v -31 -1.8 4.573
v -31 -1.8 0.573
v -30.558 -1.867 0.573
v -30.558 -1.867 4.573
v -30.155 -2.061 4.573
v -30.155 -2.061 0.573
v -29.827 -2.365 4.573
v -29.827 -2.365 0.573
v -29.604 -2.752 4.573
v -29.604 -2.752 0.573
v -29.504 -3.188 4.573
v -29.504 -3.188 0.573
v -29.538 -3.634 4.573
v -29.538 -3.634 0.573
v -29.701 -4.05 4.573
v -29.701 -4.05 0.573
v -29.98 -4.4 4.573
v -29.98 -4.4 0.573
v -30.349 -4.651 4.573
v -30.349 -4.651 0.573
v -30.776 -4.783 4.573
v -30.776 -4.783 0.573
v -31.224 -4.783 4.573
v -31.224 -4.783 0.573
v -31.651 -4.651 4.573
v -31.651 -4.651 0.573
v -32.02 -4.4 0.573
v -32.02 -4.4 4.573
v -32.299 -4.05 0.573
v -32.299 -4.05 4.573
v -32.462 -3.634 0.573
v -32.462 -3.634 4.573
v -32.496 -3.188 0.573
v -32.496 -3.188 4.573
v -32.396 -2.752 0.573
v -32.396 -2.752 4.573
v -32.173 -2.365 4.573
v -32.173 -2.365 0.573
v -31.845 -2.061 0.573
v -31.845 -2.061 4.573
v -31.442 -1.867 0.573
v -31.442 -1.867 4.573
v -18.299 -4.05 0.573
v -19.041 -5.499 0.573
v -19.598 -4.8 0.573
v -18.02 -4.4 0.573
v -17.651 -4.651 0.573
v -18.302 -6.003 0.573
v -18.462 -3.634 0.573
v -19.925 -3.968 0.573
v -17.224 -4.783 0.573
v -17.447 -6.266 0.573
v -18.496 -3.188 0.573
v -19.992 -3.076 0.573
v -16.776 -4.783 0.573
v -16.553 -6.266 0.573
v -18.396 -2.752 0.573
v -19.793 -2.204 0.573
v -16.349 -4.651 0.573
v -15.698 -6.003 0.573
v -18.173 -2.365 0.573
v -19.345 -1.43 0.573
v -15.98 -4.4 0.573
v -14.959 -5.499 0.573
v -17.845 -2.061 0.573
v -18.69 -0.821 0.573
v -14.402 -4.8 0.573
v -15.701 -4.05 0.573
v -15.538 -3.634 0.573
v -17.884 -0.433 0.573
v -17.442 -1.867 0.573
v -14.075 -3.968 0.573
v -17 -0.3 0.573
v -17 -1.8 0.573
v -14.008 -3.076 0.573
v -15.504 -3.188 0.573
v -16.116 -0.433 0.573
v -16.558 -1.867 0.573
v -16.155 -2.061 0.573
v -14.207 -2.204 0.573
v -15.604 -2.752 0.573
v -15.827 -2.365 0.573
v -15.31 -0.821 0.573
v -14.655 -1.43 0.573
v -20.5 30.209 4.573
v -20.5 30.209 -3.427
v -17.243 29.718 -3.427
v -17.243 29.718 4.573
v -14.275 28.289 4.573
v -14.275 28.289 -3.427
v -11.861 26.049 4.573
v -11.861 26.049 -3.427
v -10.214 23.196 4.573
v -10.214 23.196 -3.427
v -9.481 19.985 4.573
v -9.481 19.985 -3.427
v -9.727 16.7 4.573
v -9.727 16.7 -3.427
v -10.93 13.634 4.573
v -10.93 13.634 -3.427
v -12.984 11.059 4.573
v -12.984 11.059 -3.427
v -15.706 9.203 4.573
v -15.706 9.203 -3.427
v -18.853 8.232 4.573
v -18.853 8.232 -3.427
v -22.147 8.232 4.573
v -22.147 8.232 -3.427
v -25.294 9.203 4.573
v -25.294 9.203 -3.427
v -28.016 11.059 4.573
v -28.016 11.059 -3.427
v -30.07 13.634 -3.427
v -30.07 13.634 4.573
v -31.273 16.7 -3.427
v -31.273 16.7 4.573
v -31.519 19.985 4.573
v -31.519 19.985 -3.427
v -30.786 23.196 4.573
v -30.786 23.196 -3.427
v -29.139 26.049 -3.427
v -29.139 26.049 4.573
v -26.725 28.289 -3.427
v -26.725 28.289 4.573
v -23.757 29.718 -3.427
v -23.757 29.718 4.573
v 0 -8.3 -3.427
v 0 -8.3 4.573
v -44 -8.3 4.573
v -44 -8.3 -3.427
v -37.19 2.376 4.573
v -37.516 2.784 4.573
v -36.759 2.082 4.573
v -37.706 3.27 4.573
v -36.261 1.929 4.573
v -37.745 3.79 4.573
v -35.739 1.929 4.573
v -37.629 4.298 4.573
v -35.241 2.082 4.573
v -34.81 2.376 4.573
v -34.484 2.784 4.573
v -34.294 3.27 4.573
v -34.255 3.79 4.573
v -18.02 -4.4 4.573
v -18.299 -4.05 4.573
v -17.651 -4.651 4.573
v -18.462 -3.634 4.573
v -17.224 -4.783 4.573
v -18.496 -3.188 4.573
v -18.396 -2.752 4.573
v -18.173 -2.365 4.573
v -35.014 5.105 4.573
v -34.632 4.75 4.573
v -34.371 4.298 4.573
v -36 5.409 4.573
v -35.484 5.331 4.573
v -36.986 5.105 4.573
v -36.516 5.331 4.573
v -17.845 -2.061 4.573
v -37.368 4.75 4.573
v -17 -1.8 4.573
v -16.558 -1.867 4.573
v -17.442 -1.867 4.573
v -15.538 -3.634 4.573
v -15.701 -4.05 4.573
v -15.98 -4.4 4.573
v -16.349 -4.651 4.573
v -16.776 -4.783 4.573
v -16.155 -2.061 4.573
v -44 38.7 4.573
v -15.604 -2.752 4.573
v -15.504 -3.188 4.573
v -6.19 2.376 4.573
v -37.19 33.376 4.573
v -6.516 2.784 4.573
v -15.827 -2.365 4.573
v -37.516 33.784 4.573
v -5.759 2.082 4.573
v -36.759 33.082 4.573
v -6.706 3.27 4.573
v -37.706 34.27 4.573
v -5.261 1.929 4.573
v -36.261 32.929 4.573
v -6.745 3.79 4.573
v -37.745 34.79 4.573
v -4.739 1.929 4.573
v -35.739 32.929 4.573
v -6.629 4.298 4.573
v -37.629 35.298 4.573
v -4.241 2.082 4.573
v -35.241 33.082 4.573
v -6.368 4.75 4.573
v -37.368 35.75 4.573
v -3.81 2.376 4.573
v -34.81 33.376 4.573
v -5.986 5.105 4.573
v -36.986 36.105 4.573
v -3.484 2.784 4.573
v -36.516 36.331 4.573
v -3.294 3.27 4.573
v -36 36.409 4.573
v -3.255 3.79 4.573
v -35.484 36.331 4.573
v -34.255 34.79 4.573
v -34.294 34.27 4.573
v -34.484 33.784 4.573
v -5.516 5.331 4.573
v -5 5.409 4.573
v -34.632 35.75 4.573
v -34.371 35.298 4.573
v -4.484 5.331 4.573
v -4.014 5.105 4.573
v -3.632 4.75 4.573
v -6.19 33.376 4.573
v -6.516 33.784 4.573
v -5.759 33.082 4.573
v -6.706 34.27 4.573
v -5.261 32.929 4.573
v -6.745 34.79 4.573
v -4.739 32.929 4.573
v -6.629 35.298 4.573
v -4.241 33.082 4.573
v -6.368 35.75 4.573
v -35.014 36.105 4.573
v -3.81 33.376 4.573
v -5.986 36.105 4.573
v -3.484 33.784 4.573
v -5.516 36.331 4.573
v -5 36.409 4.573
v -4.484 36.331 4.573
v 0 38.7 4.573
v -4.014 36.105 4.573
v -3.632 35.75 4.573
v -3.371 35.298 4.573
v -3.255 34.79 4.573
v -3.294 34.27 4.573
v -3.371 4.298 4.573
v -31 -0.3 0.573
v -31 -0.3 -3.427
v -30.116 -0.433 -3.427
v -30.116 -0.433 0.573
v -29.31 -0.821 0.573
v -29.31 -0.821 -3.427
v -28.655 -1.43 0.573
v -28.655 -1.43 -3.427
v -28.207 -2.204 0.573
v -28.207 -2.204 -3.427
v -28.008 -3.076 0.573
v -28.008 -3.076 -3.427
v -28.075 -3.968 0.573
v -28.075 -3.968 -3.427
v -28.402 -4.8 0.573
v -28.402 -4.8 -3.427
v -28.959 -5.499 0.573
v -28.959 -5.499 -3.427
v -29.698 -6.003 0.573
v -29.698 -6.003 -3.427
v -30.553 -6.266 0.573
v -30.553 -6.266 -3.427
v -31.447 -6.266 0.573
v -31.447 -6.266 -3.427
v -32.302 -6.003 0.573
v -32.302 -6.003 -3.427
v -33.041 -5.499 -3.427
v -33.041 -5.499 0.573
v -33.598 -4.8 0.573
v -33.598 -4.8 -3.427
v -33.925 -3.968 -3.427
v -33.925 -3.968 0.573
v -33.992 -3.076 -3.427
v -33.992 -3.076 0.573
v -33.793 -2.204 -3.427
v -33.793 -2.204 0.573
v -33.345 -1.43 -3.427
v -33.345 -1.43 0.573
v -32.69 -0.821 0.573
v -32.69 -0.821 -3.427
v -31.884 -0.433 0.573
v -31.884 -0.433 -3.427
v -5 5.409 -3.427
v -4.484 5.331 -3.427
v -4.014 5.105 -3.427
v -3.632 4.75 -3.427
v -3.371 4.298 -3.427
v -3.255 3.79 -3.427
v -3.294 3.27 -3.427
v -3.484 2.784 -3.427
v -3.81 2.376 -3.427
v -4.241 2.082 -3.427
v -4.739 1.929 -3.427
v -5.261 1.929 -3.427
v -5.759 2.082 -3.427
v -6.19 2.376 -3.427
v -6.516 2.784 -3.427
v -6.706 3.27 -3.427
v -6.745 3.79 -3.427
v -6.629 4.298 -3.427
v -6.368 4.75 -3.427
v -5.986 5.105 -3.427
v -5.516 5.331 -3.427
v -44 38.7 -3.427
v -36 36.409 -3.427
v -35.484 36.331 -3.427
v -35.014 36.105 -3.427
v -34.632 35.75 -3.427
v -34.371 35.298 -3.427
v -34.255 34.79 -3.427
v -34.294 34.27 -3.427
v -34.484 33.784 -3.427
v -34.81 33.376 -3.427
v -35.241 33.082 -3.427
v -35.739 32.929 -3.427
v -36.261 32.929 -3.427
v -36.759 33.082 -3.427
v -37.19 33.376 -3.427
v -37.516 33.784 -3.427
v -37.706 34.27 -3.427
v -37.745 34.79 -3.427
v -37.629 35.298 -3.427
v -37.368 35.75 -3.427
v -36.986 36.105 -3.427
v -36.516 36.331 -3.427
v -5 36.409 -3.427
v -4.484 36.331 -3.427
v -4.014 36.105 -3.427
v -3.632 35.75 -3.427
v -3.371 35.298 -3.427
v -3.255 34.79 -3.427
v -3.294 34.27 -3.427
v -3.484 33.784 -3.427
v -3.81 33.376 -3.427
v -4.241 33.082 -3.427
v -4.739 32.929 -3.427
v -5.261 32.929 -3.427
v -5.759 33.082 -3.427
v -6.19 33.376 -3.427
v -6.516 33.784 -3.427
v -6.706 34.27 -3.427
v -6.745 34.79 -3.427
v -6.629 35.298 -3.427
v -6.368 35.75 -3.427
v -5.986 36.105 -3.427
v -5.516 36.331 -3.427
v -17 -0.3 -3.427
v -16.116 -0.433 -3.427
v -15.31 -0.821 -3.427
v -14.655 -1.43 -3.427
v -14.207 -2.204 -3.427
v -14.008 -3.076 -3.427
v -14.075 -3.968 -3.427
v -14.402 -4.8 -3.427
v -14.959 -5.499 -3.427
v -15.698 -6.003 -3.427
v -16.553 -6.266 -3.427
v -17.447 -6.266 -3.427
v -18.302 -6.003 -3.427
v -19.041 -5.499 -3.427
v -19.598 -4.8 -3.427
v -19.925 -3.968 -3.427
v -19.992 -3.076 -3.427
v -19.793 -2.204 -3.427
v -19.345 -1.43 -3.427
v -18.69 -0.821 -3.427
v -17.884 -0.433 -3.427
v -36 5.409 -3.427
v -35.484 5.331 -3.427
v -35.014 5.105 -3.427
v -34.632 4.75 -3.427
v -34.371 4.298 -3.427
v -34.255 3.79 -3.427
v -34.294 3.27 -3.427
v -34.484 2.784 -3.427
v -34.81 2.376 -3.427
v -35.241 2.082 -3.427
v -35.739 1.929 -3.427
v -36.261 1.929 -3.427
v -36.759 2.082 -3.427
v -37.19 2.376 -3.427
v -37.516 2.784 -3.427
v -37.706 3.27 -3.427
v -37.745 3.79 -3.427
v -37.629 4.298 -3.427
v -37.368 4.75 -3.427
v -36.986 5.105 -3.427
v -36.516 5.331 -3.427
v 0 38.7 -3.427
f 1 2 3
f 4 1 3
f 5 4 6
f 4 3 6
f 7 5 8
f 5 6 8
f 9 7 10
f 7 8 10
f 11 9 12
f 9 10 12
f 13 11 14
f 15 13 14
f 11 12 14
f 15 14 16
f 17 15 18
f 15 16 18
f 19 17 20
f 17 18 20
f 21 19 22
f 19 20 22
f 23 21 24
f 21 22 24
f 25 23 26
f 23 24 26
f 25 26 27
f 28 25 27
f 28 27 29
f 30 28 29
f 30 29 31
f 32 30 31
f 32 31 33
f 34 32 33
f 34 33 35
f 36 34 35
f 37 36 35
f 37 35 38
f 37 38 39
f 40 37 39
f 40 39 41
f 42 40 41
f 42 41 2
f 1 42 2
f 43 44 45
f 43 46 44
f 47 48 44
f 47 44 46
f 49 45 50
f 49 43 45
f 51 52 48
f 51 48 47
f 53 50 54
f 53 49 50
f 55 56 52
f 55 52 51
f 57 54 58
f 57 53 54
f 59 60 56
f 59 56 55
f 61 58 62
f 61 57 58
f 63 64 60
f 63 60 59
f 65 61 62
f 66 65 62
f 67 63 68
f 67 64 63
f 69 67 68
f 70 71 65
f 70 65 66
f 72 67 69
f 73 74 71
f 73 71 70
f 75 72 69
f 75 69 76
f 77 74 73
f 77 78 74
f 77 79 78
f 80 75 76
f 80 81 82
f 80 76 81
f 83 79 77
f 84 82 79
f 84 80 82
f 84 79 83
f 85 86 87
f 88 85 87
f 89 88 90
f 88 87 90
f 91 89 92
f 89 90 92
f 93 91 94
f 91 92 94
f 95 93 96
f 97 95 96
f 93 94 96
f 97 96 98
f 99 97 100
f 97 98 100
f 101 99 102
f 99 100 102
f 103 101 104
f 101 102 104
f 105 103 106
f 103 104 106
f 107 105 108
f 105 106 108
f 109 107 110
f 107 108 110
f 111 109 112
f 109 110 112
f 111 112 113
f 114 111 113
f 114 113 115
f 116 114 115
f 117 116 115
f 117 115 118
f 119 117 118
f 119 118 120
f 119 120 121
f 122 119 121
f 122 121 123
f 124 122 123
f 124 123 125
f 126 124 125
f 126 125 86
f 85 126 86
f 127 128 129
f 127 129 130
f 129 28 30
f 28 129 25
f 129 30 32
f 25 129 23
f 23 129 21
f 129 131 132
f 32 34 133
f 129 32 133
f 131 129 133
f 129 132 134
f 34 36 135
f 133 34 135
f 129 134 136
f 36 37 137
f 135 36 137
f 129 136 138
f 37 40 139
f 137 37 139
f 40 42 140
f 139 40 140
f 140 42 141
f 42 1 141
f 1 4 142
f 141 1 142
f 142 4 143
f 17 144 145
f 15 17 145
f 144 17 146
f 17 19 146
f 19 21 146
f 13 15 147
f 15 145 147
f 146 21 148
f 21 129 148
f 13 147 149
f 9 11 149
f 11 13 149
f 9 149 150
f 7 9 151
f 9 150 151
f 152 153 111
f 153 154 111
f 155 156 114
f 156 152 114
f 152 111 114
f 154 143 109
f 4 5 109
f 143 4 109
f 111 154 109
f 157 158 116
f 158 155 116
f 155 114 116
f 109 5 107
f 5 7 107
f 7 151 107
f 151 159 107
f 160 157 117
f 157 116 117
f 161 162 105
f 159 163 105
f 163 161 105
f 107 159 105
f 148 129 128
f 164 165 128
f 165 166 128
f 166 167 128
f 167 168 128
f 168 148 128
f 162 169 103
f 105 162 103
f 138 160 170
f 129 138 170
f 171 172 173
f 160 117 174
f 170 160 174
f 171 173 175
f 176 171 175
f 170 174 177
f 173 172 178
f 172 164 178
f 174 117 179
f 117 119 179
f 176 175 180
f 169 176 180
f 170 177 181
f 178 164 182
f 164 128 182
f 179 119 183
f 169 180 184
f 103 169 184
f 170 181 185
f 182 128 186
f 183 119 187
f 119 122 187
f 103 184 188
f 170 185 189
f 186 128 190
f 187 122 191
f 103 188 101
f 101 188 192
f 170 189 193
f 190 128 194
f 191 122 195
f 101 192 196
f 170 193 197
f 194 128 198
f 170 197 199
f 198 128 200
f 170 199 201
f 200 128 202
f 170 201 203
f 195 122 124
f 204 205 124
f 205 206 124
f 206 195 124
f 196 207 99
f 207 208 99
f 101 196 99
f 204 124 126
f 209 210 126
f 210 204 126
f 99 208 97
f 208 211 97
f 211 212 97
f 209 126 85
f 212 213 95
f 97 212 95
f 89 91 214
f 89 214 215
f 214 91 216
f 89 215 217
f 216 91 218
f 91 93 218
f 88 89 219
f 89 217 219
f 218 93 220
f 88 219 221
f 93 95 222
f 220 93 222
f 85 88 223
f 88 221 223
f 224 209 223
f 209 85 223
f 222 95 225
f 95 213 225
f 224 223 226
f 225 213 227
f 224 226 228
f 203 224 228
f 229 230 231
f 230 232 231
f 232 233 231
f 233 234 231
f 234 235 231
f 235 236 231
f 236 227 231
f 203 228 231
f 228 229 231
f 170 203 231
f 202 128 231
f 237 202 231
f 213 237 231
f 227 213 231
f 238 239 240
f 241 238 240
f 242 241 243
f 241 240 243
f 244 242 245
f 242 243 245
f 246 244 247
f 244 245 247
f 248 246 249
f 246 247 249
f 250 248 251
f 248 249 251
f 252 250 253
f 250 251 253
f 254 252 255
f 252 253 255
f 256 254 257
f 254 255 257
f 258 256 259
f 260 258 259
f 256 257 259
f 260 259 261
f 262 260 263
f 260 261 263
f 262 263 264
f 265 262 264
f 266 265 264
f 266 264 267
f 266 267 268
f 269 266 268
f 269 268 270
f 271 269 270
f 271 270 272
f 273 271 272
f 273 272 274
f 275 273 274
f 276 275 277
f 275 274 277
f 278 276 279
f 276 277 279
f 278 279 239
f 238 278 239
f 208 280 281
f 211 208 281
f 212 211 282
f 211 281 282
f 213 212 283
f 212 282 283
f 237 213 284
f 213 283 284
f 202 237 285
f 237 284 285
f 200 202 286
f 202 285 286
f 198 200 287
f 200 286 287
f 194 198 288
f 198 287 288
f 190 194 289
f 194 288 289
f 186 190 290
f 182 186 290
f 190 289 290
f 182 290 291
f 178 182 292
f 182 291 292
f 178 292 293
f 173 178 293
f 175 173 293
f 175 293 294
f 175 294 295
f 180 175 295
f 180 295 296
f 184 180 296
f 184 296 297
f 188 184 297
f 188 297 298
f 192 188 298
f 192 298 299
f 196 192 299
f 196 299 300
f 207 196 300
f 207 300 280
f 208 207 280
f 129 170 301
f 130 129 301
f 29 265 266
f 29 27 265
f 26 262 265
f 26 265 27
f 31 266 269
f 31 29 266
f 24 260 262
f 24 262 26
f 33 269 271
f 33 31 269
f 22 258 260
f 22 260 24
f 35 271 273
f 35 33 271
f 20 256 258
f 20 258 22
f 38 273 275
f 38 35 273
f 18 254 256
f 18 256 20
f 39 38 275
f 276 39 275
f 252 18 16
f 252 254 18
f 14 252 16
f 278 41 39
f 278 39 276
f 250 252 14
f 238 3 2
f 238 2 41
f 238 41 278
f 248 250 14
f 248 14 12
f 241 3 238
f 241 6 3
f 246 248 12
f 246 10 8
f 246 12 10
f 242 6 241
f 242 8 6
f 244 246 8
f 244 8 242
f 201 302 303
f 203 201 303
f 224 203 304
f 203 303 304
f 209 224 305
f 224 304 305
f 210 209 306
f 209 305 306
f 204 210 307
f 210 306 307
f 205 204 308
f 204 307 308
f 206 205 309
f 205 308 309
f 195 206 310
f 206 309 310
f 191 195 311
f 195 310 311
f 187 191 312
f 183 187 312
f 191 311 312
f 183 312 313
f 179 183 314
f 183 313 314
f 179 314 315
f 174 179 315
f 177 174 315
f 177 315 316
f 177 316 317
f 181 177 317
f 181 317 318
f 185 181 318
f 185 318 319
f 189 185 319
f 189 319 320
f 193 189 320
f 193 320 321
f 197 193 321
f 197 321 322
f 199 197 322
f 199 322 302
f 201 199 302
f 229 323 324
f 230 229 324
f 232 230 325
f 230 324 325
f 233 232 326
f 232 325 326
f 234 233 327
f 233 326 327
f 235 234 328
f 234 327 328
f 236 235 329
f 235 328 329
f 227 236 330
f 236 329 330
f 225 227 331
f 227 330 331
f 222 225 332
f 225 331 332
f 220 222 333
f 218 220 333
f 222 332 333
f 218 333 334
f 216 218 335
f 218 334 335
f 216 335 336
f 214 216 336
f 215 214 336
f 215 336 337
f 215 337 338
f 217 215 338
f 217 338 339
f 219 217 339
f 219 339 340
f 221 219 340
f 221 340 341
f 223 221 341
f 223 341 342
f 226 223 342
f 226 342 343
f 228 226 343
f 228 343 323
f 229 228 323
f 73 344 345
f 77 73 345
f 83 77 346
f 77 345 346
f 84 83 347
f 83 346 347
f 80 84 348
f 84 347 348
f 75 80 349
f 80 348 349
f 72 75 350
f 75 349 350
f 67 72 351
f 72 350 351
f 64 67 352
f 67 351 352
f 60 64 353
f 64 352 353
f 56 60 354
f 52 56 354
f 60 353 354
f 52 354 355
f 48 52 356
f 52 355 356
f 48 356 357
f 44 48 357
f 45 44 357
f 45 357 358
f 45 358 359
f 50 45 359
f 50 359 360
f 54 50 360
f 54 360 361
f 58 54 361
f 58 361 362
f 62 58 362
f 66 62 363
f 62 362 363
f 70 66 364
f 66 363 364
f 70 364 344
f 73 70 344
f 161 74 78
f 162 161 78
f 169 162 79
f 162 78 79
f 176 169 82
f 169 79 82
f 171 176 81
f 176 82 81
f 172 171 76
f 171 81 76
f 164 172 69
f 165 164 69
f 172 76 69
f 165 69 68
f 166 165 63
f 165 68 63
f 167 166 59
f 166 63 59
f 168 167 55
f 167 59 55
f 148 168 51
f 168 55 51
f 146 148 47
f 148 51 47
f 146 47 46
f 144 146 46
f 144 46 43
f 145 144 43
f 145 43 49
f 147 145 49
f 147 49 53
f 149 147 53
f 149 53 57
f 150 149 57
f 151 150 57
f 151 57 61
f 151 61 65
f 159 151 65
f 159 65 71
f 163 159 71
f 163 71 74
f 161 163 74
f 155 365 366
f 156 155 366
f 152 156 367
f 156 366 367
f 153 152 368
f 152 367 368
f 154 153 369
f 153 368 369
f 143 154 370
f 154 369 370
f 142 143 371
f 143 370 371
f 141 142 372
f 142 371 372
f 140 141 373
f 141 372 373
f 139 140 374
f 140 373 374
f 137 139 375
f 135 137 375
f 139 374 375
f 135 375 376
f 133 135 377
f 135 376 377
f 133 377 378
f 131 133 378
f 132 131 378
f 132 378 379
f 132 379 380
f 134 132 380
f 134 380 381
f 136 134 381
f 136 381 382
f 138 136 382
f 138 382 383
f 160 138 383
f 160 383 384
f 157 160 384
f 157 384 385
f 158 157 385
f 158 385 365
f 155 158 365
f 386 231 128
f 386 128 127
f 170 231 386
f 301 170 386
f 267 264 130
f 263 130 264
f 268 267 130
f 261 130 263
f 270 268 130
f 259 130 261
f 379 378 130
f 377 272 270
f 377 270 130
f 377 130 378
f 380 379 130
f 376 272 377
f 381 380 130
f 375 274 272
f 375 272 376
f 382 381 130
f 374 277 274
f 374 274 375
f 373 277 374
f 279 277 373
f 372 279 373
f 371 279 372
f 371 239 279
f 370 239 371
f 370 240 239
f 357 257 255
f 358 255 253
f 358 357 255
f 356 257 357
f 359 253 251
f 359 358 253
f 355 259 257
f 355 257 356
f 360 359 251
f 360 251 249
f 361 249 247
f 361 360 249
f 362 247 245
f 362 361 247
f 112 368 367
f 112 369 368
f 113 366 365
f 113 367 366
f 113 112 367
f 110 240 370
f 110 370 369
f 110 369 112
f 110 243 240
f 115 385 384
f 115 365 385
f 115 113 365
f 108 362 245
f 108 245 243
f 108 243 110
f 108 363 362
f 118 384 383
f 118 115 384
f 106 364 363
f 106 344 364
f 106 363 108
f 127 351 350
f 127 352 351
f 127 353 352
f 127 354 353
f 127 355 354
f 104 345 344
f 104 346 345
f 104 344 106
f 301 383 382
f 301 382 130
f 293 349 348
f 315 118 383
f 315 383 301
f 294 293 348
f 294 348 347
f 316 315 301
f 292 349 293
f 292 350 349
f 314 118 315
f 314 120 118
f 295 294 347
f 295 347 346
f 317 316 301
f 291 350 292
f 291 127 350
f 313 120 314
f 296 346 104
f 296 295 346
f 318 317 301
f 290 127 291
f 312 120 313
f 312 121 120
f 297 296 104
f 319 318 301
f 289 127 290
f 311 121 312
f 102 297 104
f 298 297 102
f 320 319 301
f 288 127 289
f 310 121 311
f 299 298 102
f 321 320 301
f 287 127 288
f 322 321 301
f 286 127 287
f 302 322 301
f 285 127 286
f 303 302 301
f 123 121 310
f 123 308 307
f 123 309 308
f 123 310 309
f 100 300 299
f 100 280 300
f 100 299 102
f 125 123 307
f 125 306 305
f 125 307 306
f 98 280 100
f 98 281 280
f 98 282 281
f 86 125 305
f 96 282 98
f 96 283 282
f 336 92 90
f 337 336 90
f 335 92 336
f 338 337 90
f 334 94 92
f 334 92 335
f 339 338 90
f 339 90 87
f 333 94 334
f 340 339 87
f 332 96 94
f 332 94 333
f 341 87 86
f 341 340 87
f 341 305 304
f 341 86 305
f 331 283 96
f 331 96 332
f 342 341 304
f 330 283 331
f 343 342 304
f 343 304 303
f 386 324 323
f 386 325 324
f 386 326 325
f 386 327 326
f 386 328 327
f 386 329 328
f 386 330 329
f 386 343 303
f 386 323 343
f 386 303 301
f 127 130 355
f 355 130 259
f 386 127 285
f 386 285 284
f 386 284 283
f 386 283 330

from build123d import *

# Parameters (mm, degrees)
SKETCH_1_W          = 8
SKETCH_1_H          = 47
EXTRUDE_1_DEPTH     = 44
CUT_EXTRUDE_1_REACH = 61.141
SKETCH_2_R          = 11.05
SKETCH_2_R_2        = 1.75
SKETCH_2_R_3        = 1.5
SKETCH_6_R          = 3
CUT_EXTRUDE_3_DEPTH = 4


with BuildPart() as part:
    # 草图1 → 凸台-拉伸1 (new body)
    with BuildSketch(Plane(origin=(0, 0, 0), x_dir=(0, 0, -1), z_dir=(1, 0, 0))):
        with Locations((-0.573456279, 15.2)):
            Rectangle(SKETCH_1_W, SKETCH_1_H)
    extrude(amount=-EXTRUDE_1_DEPTH)

    # 草图2 → 切除-拉伸1 (cut, up to next)
    with BuildSketch(Plane(origin=(0, 0, -3.426543721), x_dir=(-1, 0, 0), z_dir=(0, 0, -1)), mode=Mode.PRIVATE) as cut_extrude_1_sk1:
        with Locations(Location((20.5, 19.159060435, 0), (0, 0, 90))):
            Circle(SKETCH_2_R)
    cut_extrude_1_tool1 = extrude(cut_extrude_1_sk1.sketch, amount=-CUT_EXTRUDE_1_REACH, mode=Mode.PRIVATE) & part.part
    # 草图2 → 切除-拉伸1 (cut, up to next)
    with BuildSketch(Plane(origin=(0, 0, -3.426543721), x_dir=(-1, 0, 0), z_dir=(0, 0, -1)), mode=Mode.PRIVATE) as cut_extrude_1_sk2:
        with Locations(Location((5, 34.659060435, 0), (0, 0, 90))):
            Circle(SKETCH_2_R_2)
    cut_extrude_1_tool2 = extrude(cut_extrude_1_sk2.sketch, amount=-CUT_EXTRUDE_1_REACH, mode=Mode.PRIVATE) & part.part
    # 草图2 → 切除-拉伸1 (cut, up to next)
    with BuildSketch(Plane(origin=(0, 0, -3.426543721), x_dir=(-1, 0, 0), z_dir=(0, 0, -1)), mode=Mode.PRIVATE) as cut_extrude_1_sk3:
        with Locations(Location((5, 3.659060435, 0), (0, 0, 90))):
            Circle(SKETCH_2_R_2)
    cut_extrude_1_tool3 = extrude(cut_extrude_1_sk3.sketch, amount=-CUT_EXTRUDE_1_REACH, mode=Mode.PRIVATE) & part.part
    # 草图2 → 切除-拉伸1 (cut, up to next)
    with BuildSketch(Plane(origin=(0, 0, -3.426543721), x_dir=(-1, 0, 0), z_dir=(0, 0, -1)), mode=Mode.PRIVATE) as cut_extrude_1_sk4:
        with Locations(Location((36, 3.659060435, 0), (0, 0, 90))):
            Circle(SKETCH_2_R_2)
    cut_extrude_1_tool4 = extrude(cut_extrude_1_sk4.sketch, amount=-CUT_EXTRUDE_1_REACH, mode=Mode.PRIVATE) & part.part
    # 草图2 → 切除-拉伸1 (cut, up to next)
    with BuildSketch(Plane(origin=(0, 0, -3.426543721), x_dir=(-1, 0, 0), z_dir=(0, 0, -1)), mode=Mode.PRIVATE) as cut_extrude_1_sk5:
        with Locations(Location((36, 34.659060435, 0), (0, 0, 90))):
            Circle(SKETCH_2_R_2)
    cut_extrude_1_tool5 = extrude(cut_extrude_1_sk5.sketch, amount=-CUT_EXTRUDE_1_REACH, mode=Mode.PRIVATE) & part.part
    # 草图2 → 切除-拉伸1 (cut, up to next)
    with BuildSketch(Plane(origin=(0, 0, -3.426543721), x_dir=(-1, 0, 0), z_dir=(0, 0, -1)), mode=Mode.PRIVATE) as cut_extrude_1_sk6:
        with Locations(Location((17, -3.3, 0), (0, 0, 90))):
            Circle(SKETCH_2_R_3)
    cut_extrude_1_tool6 = extrude(cut_extrude_1_sk6.sketch, amount=-CUT_EXTRUDE_1_REACH, mode=Mode.PRIVATE) & part.part
    # 草图2 → 切除-拉伸1 (cut, up to next)
    with BuildSketch(Plane(origin=(0, 0, -3.426543721), x_dir=(-1, 0, 0), z_dir=(0, 0, -1)), mode=Mode.PRIVATE) as cut_extrude_1_sk7:
        with Locations(Location((31, -3.3, 0), (0, 0, 90))):
            Circle(SKETCH_2_R_3)
    cut_extrude_1_tool7 = extrude(cut_extrude_1_sk7.sketch, amount=-CUT_EXTRUDE_1_REACH, mode=Mode.PRIVATE) & part.part
    add(cut_extrude_1_tool1.solids().sort_by_distance((-20.5, 19.15906, -3.426544))[0], mode=Mode.SUBTRACT)
    add(cut_extrude_1_tool2.solids().sort_by_distance((-5, 34.65906, -3.426544))[0], mode=Mode.SUBTRACT)
    add(cut_extrude_1_tool3.solids().sort_by_distance((-5, 3.65906, -3.426544))[0], mode=Mode.SUBTRACT)
    add(cut_extrude_1_tool4.solids().sort_by_distance((-36, 3.65906, -3.426544))[0], mode=Mode.SUBTRACT)
    add(cut_extrude_1_tool5.solids().sort_by_distance((-36, 34.65906, -3.426544))[0], mode=Mode.SUBTRACT)
    add(cut_extrude_1_tool6.solids().sort_by_distance((-17, -3.3, -3.426544))[0], mode=Mode.SUBTRACT)
    add(cut_extrude_1_tool7.solids().sort_by_distance((-31, -3.3, -3.426544))[0], mode=Mode.SUBTRACT)

    # 草图6 → 切除-拉伸3 (cut)
    with BuildSketch(Plane(origin=(0, 0, -3.426543721), x_dir=(-1, 0, 0), z_dir=(0, 0, -1))):
        with Locations(Location((17, -3.3, 0), (0, 0, 90))):
            Circle(SKETCH_6_R)
        with Locations(Location((31, -3.3, 0), (0, 0, 90))):
            Circle(SKETCH_6_R)
    extrude(amount=-CUT_EXTRUDE_3_DEPTH, mode=Mode.SUBTRACT)


solid = part.part
